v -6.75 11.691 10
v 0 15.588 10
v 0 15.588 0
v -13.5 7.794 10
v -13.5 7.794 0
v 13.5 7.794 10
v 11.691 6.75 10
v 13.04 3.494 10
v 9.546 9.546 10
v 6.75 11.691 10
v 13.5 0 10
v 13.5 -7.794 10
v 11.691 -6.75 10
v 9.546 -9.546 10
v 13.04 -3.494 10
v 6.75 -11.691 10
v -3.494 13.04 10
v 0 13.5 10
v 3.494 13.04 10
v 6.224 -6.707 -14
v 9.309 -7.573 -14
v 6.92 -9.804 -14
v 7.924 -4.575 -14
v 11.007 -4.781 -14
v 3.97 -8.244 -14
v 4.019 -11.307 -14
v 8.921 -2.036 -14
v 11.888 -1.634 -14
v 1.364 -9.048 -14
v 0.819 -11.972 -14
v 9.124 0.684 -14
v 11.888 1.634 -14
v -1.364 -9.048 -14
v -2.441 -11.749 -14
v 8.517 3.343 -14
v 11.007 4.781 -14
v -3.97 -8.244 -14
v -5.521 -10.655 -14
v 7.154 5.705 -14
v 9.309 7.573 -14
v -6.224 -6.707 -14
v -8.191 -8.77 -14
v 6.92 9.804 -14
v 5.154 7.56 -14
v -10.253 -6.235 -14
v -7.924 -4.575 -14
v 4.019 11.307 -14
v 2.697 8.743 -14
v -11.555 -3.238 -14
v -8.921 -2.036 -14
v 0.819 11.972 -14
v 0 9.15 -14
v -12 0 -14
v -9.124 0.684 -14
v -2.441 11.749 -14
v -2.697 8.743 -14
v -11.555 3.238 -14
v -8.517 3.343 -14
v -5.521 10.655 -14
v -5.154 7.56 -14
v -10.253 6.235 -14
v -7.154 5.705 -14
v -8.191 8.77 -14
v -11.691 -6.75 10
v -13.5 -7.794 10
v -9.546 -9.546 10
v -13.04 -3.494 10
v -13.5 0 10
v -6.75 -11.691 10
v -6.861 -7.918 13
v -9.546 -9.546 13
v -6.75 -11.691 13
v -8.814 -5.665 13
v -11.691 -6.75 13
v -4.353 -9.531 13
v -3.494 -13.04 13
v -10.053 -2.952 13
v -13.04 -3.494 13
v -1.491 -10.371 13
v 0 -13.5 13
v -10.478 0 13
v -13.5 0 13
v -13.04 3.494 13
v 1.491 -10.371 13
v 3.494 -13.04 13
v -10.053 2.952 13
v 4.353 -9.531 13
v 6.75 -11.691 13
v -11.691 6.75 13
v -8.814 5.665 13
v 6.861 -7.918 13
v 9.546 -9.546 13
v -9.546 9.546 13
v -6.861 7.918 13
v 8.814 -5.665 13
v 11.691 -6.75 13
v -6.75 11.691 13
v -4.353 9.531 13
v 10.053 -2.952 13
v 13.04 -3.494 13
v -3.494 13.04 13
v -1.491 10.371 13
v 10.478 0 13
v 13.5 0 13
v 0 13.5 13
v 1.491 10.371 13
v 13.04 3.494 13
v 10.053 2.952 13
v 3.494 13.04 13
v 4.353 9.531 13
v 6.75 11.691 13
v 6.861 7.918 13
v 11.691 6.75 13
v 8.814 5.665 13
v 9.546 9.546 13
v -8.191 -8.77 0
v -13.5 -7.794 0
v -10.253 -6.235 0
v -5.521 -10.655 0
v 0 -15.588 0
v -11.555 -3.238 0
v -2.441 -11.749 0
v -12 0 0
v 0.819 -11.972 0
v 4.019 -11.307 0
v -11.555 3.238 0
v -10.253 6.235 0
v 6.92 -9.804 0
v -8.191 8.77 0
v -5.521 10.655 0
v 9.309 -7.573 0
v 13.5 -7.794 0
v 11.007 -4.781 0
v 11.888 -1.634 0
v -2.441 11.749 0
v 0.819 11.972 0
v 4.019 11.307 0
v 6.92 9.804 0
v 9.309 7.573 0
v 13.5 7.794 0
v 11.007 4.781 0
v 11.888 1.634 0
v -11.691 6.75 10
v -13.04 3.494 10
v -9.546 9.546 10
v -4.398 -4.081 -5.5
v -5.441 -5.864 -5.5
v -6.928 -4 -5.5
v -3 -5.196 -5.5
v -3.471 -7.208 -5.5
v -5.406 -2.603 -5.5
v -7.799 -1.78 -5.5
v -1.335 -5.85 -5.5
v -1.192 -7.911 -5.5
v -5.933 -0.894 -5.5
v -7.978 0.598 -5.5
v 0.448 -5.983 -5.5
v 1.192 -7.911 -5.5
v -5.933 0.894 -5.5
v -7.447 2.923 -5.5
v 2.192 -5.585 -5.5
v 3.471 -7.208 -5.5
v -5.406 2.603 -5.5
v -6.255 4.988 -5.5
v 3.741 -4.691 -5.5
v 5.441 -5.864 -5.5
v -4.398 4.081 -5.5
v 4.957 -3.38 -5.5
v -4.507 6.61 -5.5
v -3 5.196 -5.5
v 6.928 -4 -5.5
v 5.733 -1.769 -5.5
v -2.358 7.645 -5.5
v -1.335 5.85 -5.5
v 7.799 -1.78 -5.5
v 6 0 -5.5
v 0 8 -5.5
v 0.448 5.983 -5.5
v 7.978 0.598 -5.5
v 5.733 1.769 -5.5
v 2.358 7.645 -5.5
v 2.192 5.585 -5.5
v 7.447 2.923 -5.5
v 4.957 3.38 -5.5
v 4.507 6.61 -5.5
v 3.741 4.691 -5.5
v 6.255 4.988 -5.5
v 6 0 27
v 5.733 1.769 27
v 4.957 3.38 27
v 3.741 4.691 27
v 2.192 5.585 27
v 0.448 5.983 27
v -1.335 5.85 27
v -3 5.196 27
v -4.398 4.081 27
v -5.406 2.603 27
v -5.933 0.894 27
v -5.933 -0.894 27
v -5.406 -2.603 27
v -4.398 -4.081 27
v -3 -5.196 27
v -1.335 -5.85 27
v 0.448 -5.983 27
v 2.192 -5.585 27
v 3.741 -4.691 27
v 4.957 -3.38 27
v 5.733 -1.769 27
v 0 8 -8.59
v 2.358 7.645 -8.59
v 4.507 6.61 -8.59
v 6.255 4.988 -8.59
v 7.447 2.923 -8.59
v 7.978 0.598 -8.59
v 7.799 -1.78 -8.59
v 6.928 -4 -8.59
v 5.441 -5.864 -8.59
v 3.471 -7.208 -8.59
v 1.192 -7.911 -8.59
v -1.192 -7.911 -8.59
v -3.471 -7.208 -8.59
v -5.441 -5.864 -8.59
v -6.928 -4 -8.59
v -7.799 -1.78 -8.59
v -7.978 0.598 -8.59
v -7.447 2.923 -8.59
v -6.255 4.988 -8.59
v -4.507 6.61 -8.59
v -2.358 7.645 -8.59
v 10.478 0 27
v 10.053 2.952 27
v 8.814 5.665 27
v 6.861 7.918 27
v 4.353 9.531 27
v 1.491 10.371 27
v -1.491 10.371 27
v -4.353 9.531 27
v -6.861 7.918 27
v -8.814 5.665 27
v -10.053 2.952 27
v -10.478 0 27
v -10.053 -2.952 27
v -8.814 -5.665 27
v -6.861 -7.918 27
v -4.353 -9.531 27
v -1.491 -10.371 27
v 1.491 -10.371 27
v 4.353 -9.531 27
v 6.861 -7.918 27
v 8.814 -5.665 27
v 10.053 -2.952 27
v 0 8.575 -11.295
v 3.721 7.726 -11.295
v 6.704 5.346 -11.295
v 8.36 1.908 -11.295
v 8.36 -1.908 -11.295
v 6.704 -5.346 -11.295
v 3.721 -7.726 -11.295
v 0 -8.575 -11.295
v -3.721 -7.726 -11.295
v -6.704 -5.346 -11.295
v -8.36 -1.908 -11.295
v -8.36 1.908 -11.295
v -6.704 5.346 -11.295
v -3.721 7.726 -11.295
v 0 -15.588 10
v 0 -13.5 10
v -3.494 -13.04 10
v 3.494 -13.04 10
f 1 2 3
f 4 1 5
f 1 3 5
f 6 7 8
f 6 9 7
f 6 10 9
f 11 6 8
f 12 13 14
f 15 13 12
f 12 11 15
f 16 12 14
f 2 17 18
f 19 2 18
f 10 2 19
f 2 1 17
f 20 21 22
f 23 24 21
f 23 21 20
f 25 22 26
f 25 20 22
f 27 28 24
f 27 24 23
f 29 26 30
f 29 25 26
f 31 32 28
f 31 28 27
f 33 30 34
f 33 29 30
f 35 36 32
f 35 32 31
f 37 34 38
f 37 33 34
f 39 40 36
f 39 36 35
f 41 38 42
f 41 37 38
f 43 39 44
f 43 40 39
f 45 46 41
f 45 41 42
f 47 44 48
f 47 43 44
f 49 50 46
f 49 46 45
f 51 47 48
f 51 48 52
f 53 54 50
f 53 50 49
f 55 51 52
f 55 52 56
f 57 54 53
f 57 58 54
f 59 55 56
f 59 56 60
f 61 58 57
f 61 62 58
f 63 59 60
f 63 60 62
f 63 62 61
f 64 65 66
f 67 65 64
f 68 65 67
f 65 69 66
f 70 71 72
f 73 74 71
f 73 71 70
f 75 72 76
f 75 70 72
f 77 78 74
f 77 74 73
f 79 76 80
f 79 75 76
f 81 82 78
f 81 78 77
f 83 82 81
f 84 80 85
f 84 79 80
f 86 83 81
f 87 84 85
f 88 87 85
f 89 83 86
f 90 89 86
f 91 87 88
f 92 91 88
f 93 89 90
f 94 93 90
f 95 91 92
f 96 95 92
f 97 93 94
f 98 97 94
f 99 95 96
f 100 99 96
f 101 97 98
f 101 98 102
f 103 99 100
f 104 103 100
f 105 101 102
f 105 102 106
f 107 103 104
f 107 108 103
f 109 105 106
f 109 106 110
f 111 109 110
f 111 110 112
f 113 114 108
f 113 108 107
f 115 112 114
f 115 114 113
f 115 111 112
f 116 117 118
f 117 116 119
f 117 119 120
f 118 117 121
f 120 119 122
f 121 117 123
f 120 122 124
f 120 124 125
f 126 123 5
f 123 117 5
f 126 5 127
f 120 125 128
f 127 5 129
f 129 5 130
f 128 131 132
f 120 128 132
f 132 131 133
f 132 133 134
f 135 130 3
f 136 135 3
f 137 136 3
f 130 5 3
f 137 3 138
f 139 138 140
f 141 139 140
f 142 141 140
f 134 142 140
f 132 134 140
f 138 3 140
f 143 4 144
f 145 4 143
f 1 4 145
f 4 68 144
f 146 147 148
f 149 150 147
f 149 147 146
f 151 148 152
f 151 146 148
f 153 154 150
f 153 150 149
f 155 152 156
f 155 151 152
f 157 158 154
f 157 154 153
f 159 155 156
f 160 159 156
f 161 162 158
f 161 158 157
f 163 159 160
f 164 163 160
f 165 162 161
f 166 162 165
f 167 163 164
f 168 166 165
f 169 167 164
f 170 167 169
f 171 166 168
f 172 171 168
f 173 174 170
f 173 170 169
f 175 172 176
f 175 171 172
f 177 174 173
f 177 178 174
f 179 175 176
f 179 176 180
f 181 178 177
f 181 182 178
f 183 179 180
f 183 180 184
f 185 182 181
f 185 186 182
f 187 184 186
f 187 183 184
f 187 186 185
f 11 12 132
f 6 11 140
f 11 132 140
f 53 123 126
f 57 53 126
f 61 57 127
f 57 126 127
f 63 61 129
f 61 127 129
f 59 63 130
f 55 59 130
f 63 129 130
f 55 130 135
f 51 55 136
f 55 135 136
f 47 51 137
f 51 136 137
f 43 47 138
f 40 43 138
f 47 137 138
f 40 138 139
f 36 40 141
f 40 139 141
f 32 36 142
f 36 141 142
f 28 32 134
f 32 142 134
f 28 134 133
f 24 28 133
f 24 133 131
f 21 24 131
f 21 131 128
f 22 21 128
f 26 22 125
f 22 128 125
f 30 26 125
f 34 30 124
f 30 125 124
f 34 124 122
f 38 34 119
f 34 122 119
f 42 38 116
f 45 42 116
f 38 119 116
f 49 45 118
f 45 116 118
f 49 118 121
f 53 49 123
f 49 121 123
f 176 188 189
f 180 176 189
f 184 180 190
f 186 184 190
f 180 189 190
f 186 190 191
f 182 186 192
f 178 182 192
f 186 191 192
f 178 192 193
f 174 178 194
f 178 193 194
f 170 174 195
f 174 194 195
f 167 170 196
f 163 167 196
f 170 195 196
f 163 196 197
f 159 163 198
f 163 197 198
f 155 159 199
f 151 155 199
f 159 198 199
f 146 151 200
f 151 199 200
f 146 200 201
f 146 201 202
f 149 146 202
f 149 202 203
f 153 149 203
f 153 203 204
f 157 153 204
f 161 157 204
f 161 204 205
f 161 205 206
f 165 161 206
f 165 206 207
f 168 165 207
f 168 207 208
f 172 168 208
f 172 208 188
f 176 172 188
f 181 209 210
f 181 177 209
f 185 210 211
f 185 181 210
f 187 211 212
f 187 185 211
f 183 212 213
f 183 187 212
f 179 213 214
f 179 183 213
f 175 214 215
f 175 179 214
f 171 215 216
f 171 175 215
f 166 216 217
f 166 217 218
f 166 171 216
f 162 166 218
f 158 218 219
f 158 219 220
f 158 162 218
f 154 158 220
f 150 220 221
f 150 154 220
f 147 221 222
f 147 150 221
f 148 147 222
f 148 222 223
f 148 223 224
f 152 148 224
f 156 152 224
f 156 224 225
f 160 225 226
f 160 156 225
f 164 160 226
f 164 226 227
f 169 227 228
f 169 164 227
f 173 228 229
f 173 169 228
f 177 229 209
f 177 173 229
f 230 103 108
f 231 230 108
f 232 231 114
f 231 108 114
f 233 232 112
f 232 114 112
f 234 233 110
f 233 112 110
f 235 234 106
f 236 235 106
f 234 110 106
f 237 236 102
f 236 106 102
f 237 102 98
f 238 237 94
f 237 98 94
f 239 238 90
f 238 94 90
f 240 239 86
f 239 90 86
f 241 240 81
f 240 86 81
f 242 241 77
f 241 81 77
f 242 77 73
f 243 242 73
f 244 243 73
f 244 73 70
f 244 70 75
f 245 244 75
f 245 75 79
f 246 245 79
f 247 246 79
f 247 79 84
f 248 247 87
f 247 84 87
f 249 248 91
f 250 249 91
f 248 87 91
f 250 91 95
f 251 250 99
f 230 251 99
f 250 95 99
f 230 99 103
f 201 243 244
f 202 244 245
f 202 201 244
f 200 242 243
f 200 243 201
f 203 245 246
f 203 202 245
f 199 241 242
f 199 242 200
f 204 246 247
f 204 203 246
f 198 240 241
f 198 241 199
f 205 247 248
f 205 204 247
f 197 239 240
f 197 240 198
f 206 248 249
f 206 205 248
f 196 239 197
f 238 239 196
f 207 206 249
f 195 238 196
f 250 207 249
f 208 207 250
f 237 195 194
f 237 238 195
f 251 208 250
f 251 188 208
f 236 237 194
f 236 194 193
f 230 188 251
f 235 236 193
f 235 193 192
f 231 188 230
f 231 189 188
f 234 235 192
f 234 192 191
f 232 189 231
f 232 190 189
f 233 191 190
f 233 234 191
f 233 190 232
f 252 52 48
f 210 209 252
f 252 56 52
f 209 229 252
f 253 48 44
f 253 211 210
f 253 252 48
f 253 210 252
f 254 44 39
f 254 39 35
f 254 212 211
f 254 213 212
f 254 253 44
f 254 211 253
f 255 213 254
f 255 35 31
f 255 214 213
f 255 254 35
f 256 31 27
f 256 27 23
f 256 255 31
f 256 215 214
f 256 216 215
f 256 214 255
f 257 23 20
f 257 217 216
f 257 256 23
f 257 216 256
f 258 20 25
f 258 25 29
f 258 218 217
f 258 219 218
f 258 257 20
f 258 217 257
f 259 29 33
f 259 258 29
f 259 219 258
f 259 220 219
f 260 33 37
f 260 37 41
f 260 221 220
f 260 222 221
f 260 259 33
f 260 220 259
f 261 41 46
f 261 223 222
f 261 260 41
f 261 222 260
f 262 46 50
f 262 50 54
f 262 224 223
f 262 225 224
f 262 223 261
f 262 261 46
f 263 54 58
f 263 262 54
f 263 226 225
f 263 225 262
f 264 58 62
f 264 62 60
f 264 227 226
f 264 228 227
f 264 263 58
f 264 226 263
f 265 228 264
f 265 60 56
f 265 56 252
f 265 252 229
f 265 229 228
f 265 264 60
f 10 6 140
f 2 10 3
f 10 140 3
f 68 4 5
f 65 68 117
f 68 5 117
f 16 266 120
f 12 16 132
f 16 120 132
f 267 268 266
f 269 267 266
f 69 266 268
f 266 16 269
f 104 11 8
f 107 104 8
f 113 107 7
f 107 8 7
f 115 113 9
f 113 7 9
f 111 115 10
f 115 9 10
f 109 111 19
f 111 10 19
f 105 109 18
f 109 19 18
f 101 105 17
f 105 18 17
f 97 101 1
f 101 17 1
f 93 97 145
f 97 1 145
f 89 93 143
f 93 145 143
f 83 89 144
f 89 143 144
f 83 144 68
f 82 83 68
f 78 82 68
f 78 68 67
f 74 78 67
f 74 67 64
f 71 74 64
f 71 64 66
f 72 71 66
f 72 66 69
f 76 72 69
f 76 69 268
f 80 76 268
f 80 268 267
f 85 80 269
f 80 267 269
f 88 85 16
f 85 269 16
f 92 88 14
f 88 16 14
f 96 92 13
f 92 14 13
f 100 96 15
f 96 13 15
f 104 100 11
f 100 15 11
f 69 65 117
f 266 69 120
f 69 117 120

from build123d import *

# Parameters (mm, degrees)
BASE_EXTRUDE_DEPTH  = 10
SKETCH2_R           = 13.5
BOSS_EXTRUDE1_DEPTH = 3
SKETCH3_R           = 10.4775
BOSS_EXTRUDE2_DEPTH = 14
SKETCH4_R           = 12
BOSS_EXTRUDE3_DEPTH = 14
SKETCH5_R           = 6
CUT_EXTRUDE1_DEPTH  = 42


with BuildPart() as part:
    # Sketch1 → Base-Extrude (new body)
    with BuildSketch(Plane.XY):
        Polygon((0, 15.588457268), (-13.5, 7.794228634), (-13.5, -7.794228634), (0, -15.588457268), (13.5, -7.794228634), (13.5, 7.794228634), align=None)
    extrude(amount=BASE_EXTRUDE_DEPTH)

    # Sketch2 → Boss-Extrude1 (add)
    with BuildSketch(Plane.XY.offset(10)):
        Circle(SKETCH2_R)
    extrude(amount=BOSS_EXTRUDE1_DEPTH)

    # Sketch3 → Boss-Extrude2 (add)
    with BuildSketch(Plane.XY.offset(13)):
        Circle(SKETCH3_R)
    extrude(amount=BOSS_EXTRUDE2_DEPTH)

    # Sketch4 → Boss-Extrude3 (add)
    with BuildSketch(Plane(origin=(0, 0, 0), x_dir=(-1, 0, 0), z_dir=(0, 0, -1))):
        Circle(SKETCH4_R)
    extrude(amount=BOSS_EXTRUDE3_DEPTH)

    # Sketch5 → Cut-Extrude1 (cut, through all)
    with BuildSketch(Plane.XY.offset(27)):
        Circle(SKETCH5_R)
    extrude(amount=-CUT_EXTRUDE1_DEPTH, mode=Mode.SUBTRACT)

    # Sketch7 → Cut-Revolve1 (revolve, cut)
    with BuildSketch(Plane(origin=(0, 0, 0), x_dir=(0, 0, -1), z_dir=(1, 0, 0))):
        Polygon((14, 0), (14, 9.15), (8.589675374, 8), (5.5, 8), (5.5, 0), align=None)
    revolve(axis=Axis((0, 0, 0), (0, 0, -1)), mode=Mode.SUBTRACT)


solid = part.part
